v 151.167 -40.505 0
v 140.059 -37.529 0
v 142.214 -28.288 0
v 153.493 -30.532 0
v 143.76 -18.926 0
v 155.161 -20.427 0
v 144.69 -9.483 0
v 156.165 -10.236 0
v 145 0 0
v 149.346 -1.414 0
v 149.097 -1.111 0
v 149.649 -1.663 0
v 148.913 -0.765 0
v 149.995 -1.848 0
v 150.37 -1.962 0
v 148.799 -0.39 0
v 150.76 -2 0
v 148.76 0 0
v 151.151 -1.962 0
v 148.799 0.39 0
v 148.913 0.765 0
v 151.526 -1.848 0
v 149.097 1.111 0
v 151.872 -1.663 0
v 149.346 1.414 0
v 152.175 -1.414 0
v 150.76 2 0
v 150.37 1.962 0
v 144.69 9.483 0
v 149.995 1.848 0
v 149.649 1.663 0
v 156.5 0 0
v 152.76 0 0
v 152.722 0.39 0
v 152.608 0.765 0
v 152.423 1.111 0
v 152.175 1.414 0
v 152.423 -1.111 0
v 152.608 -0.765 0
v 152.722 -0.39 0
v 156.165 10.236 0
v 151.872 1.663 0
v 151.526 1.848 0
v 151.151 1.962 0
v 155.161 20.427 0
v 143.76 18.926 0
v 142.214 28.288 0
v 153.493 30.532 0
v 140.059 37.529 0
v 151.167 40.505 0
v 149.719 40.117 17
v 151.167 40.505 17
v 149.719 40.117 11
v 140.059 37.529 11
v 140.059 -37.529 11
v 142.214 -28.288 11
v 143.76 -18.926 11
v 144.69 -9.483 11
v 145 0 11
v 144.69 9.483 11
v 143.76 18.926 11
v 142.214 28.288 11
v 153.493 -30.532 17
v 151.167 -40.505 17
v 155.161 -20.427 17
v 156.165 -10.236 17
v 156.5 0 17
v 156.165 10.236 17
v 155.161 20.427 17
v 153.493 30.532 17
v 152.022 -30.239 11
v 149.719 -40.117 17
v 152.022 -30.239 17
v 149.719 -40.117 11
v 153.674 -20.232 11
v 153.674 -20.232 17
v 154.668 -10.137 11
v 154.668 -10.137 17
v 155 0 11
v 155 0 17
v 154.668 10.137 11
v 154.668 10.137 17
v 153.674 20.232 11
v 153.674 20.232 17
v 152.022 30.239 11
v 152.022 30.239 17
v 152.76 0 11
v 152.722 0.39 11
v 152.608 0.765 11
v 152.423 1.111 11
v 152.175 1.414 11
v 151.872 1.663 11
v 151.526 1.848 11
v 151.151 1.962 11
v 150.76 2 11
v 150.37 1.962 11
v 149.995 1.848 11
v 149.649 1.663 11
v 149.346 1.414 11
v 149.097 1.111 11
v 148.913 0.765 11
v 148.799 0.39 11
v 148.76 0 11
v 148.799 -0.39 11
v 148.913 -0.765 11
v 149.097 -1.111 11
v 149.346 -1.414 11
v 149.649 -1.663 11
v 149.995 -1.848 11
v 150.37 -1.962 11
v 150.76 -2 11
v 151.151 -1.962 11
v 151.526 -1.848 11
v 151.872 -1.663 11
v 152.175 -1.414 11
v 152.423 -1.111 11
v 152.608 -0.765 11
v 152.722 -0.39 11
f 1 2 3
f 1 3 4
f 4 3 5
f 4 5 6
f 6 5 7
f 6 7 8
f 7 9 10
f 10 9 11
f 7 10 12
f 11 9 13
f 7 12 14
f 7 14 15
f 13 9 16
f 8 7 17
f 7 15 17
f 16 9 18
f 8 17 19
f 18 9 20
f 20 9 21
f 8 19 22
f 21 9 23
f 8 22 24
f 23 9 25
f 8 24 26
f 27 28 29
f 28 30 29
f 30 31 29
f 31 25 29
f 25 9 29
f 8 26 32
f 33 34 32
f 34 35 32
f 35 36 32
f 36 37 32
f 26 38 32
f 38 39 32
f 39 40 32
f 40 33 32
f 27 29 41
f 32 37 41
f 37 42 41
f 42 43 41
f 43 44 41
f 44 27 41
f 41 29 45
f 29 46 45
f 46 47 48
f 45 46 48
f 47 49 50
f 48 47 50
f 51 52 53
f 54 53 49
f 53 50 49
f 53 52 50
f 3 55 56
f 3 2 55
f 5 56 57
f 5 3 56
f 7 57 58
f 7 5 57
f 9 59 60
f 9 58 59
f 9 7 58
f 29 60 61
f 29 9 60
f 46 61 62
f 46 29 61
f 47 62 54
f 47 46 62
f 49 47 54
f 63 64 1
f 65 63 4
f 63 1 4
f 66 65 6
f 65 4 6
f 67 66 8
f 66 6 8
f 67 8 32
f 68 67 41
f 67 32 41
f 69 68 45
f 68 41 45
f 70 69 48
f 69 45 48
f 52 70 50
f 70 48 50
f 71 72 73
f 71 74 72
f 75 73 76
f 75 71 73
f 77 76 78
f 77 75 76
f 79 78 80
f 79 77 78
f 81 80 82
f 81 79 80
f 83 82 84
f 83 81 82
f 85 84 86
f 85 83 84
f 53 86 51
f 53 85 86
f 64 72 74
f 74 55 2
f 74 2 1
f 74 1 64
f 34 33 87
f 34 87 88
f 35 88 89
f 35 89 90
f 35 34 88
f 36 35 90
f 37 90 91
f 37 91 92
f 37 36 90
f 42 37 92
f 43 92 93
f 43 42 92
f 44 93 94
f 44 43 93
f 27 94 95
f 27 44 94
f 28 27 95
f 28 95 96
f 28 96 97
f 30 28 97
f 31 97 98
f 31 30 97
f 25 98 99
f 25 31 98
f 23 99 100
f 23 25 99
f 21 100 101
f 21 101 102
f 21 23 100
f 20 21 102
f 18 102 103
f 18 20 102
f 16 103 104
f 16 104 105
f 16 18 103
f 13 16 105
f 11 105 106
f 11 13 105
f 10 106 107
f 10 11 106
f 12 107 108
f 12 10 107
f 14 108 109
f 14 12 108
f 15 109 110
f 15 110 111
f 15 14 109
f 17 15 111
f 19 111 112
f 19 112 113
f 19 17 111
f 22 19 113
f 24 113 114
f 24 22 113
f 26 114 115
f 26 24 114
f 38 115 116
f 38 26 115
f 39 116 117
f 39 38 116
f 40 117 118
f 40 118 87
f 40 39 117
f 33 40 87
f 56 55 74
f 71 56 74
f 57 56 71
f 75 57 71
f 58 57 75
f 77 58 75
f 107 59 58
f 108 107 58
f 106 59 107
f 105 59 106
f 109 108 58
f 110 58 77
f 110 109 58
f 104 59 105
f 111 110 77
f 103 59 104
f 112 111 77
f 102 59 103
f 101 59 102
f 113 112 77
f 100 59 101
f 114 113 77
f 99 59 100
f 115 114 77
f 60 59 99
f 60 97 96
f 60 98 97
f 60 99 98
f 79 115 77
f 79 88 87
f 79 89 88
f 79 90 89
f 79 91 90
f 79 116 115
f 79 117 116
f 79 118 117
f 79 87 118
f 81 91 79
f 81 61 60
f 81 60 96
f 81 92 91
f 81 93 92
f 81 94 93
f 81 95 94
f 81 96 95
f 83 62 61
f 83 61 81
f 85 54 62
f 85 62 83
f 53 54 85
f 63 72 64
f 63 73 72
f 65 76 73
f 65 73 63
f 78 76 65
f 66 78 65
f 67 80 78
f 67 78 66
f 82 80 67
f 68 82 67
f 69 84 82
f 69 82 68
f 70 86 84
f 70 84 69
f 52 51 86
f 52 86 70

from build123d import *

# Parameters (mm, degrees)
F0_R     = 156.5
F0_R_2   = 155
F2_DEPTH = 17
F1_R     = 156.5
F1_R_2   = 2
F1_R_3   = 145
F3_DEPTH = 11
F5_DEPTH = 25


with BuildPart() as f2:
    # F0 (on Top) → F2 (new body)
    with BuildSketch(Plane.XY):
        Circle(F0_R)
        Circle(F0_R_2, mode=Mode.SUBTRACT)
    extrude(amount=F2_DEPTH)

    # F1 (on face) → F3 (join)
    with BuildSketch(Plane.XY):
        Circle(F1_R)
        with Locations((-75.380214, -130.56236)):
            Circle(F1_R_2, mode=Mode.SUBTRACT)
        with Locations((-130.56236, -75.380214)):
            Circle(F1_R_2, mode=Mode.SUBTRACT)
        with Locations((0, -150.760427)):
            Circle(F1_R_2, mode=Mode.SUBTRACT)
        with Locations((75.380214, -130.56236)):
            Circle(F1_R_2, mode=Mode.SUBTRACT)
        with Locations((130.56236, -75.380214)):
            Circle(F1_R_2, mode=Mode.SUBTRACT)
        with Locations((-150.760427, 0)):
            Circle(F1_R_2, mode=Mode.SUBTRACT)
        with Locations((-130.56236, 75.380214)):
            Circle(F1_R_2, mode=Mode.SUBTRACT)
        with Locations((-75.380214, 130.56236)):
            Circle(F1_R_2, mode=Mode.SUBTRACT)
        Circle(F1_R_3, mode=Mode.SUBTRACT)
        with Locations((150.760427, 0)):
            Circle(F1_R_2, mode=Mode.SUBTRACT)
        with Locations((130.56236, 75.380214)):
            Circle(F1_R_2, mode=Mode.SUBTRACT)
        with Locations((0, 150.760427)):
            Circle(F1_R_2, mode=Mode.SUBTRACT)
        with Locations((75.380214, 130.56236)):
            Circle(F1_R_2, mode=Mode.SUBTRACT)
    extrude(amount=F3_DEPTH)

    # F4 (on Top) → F5 (intersect)
    with BuildSketch(Plane.XY):
        Polygon((186.290355, 49.91635), (0, 0), (186.290355, -49.91635), align=None)
    extrude(amount=F5_DEPTH, mode=Mode.INTERSECT)


solid = f2.part
